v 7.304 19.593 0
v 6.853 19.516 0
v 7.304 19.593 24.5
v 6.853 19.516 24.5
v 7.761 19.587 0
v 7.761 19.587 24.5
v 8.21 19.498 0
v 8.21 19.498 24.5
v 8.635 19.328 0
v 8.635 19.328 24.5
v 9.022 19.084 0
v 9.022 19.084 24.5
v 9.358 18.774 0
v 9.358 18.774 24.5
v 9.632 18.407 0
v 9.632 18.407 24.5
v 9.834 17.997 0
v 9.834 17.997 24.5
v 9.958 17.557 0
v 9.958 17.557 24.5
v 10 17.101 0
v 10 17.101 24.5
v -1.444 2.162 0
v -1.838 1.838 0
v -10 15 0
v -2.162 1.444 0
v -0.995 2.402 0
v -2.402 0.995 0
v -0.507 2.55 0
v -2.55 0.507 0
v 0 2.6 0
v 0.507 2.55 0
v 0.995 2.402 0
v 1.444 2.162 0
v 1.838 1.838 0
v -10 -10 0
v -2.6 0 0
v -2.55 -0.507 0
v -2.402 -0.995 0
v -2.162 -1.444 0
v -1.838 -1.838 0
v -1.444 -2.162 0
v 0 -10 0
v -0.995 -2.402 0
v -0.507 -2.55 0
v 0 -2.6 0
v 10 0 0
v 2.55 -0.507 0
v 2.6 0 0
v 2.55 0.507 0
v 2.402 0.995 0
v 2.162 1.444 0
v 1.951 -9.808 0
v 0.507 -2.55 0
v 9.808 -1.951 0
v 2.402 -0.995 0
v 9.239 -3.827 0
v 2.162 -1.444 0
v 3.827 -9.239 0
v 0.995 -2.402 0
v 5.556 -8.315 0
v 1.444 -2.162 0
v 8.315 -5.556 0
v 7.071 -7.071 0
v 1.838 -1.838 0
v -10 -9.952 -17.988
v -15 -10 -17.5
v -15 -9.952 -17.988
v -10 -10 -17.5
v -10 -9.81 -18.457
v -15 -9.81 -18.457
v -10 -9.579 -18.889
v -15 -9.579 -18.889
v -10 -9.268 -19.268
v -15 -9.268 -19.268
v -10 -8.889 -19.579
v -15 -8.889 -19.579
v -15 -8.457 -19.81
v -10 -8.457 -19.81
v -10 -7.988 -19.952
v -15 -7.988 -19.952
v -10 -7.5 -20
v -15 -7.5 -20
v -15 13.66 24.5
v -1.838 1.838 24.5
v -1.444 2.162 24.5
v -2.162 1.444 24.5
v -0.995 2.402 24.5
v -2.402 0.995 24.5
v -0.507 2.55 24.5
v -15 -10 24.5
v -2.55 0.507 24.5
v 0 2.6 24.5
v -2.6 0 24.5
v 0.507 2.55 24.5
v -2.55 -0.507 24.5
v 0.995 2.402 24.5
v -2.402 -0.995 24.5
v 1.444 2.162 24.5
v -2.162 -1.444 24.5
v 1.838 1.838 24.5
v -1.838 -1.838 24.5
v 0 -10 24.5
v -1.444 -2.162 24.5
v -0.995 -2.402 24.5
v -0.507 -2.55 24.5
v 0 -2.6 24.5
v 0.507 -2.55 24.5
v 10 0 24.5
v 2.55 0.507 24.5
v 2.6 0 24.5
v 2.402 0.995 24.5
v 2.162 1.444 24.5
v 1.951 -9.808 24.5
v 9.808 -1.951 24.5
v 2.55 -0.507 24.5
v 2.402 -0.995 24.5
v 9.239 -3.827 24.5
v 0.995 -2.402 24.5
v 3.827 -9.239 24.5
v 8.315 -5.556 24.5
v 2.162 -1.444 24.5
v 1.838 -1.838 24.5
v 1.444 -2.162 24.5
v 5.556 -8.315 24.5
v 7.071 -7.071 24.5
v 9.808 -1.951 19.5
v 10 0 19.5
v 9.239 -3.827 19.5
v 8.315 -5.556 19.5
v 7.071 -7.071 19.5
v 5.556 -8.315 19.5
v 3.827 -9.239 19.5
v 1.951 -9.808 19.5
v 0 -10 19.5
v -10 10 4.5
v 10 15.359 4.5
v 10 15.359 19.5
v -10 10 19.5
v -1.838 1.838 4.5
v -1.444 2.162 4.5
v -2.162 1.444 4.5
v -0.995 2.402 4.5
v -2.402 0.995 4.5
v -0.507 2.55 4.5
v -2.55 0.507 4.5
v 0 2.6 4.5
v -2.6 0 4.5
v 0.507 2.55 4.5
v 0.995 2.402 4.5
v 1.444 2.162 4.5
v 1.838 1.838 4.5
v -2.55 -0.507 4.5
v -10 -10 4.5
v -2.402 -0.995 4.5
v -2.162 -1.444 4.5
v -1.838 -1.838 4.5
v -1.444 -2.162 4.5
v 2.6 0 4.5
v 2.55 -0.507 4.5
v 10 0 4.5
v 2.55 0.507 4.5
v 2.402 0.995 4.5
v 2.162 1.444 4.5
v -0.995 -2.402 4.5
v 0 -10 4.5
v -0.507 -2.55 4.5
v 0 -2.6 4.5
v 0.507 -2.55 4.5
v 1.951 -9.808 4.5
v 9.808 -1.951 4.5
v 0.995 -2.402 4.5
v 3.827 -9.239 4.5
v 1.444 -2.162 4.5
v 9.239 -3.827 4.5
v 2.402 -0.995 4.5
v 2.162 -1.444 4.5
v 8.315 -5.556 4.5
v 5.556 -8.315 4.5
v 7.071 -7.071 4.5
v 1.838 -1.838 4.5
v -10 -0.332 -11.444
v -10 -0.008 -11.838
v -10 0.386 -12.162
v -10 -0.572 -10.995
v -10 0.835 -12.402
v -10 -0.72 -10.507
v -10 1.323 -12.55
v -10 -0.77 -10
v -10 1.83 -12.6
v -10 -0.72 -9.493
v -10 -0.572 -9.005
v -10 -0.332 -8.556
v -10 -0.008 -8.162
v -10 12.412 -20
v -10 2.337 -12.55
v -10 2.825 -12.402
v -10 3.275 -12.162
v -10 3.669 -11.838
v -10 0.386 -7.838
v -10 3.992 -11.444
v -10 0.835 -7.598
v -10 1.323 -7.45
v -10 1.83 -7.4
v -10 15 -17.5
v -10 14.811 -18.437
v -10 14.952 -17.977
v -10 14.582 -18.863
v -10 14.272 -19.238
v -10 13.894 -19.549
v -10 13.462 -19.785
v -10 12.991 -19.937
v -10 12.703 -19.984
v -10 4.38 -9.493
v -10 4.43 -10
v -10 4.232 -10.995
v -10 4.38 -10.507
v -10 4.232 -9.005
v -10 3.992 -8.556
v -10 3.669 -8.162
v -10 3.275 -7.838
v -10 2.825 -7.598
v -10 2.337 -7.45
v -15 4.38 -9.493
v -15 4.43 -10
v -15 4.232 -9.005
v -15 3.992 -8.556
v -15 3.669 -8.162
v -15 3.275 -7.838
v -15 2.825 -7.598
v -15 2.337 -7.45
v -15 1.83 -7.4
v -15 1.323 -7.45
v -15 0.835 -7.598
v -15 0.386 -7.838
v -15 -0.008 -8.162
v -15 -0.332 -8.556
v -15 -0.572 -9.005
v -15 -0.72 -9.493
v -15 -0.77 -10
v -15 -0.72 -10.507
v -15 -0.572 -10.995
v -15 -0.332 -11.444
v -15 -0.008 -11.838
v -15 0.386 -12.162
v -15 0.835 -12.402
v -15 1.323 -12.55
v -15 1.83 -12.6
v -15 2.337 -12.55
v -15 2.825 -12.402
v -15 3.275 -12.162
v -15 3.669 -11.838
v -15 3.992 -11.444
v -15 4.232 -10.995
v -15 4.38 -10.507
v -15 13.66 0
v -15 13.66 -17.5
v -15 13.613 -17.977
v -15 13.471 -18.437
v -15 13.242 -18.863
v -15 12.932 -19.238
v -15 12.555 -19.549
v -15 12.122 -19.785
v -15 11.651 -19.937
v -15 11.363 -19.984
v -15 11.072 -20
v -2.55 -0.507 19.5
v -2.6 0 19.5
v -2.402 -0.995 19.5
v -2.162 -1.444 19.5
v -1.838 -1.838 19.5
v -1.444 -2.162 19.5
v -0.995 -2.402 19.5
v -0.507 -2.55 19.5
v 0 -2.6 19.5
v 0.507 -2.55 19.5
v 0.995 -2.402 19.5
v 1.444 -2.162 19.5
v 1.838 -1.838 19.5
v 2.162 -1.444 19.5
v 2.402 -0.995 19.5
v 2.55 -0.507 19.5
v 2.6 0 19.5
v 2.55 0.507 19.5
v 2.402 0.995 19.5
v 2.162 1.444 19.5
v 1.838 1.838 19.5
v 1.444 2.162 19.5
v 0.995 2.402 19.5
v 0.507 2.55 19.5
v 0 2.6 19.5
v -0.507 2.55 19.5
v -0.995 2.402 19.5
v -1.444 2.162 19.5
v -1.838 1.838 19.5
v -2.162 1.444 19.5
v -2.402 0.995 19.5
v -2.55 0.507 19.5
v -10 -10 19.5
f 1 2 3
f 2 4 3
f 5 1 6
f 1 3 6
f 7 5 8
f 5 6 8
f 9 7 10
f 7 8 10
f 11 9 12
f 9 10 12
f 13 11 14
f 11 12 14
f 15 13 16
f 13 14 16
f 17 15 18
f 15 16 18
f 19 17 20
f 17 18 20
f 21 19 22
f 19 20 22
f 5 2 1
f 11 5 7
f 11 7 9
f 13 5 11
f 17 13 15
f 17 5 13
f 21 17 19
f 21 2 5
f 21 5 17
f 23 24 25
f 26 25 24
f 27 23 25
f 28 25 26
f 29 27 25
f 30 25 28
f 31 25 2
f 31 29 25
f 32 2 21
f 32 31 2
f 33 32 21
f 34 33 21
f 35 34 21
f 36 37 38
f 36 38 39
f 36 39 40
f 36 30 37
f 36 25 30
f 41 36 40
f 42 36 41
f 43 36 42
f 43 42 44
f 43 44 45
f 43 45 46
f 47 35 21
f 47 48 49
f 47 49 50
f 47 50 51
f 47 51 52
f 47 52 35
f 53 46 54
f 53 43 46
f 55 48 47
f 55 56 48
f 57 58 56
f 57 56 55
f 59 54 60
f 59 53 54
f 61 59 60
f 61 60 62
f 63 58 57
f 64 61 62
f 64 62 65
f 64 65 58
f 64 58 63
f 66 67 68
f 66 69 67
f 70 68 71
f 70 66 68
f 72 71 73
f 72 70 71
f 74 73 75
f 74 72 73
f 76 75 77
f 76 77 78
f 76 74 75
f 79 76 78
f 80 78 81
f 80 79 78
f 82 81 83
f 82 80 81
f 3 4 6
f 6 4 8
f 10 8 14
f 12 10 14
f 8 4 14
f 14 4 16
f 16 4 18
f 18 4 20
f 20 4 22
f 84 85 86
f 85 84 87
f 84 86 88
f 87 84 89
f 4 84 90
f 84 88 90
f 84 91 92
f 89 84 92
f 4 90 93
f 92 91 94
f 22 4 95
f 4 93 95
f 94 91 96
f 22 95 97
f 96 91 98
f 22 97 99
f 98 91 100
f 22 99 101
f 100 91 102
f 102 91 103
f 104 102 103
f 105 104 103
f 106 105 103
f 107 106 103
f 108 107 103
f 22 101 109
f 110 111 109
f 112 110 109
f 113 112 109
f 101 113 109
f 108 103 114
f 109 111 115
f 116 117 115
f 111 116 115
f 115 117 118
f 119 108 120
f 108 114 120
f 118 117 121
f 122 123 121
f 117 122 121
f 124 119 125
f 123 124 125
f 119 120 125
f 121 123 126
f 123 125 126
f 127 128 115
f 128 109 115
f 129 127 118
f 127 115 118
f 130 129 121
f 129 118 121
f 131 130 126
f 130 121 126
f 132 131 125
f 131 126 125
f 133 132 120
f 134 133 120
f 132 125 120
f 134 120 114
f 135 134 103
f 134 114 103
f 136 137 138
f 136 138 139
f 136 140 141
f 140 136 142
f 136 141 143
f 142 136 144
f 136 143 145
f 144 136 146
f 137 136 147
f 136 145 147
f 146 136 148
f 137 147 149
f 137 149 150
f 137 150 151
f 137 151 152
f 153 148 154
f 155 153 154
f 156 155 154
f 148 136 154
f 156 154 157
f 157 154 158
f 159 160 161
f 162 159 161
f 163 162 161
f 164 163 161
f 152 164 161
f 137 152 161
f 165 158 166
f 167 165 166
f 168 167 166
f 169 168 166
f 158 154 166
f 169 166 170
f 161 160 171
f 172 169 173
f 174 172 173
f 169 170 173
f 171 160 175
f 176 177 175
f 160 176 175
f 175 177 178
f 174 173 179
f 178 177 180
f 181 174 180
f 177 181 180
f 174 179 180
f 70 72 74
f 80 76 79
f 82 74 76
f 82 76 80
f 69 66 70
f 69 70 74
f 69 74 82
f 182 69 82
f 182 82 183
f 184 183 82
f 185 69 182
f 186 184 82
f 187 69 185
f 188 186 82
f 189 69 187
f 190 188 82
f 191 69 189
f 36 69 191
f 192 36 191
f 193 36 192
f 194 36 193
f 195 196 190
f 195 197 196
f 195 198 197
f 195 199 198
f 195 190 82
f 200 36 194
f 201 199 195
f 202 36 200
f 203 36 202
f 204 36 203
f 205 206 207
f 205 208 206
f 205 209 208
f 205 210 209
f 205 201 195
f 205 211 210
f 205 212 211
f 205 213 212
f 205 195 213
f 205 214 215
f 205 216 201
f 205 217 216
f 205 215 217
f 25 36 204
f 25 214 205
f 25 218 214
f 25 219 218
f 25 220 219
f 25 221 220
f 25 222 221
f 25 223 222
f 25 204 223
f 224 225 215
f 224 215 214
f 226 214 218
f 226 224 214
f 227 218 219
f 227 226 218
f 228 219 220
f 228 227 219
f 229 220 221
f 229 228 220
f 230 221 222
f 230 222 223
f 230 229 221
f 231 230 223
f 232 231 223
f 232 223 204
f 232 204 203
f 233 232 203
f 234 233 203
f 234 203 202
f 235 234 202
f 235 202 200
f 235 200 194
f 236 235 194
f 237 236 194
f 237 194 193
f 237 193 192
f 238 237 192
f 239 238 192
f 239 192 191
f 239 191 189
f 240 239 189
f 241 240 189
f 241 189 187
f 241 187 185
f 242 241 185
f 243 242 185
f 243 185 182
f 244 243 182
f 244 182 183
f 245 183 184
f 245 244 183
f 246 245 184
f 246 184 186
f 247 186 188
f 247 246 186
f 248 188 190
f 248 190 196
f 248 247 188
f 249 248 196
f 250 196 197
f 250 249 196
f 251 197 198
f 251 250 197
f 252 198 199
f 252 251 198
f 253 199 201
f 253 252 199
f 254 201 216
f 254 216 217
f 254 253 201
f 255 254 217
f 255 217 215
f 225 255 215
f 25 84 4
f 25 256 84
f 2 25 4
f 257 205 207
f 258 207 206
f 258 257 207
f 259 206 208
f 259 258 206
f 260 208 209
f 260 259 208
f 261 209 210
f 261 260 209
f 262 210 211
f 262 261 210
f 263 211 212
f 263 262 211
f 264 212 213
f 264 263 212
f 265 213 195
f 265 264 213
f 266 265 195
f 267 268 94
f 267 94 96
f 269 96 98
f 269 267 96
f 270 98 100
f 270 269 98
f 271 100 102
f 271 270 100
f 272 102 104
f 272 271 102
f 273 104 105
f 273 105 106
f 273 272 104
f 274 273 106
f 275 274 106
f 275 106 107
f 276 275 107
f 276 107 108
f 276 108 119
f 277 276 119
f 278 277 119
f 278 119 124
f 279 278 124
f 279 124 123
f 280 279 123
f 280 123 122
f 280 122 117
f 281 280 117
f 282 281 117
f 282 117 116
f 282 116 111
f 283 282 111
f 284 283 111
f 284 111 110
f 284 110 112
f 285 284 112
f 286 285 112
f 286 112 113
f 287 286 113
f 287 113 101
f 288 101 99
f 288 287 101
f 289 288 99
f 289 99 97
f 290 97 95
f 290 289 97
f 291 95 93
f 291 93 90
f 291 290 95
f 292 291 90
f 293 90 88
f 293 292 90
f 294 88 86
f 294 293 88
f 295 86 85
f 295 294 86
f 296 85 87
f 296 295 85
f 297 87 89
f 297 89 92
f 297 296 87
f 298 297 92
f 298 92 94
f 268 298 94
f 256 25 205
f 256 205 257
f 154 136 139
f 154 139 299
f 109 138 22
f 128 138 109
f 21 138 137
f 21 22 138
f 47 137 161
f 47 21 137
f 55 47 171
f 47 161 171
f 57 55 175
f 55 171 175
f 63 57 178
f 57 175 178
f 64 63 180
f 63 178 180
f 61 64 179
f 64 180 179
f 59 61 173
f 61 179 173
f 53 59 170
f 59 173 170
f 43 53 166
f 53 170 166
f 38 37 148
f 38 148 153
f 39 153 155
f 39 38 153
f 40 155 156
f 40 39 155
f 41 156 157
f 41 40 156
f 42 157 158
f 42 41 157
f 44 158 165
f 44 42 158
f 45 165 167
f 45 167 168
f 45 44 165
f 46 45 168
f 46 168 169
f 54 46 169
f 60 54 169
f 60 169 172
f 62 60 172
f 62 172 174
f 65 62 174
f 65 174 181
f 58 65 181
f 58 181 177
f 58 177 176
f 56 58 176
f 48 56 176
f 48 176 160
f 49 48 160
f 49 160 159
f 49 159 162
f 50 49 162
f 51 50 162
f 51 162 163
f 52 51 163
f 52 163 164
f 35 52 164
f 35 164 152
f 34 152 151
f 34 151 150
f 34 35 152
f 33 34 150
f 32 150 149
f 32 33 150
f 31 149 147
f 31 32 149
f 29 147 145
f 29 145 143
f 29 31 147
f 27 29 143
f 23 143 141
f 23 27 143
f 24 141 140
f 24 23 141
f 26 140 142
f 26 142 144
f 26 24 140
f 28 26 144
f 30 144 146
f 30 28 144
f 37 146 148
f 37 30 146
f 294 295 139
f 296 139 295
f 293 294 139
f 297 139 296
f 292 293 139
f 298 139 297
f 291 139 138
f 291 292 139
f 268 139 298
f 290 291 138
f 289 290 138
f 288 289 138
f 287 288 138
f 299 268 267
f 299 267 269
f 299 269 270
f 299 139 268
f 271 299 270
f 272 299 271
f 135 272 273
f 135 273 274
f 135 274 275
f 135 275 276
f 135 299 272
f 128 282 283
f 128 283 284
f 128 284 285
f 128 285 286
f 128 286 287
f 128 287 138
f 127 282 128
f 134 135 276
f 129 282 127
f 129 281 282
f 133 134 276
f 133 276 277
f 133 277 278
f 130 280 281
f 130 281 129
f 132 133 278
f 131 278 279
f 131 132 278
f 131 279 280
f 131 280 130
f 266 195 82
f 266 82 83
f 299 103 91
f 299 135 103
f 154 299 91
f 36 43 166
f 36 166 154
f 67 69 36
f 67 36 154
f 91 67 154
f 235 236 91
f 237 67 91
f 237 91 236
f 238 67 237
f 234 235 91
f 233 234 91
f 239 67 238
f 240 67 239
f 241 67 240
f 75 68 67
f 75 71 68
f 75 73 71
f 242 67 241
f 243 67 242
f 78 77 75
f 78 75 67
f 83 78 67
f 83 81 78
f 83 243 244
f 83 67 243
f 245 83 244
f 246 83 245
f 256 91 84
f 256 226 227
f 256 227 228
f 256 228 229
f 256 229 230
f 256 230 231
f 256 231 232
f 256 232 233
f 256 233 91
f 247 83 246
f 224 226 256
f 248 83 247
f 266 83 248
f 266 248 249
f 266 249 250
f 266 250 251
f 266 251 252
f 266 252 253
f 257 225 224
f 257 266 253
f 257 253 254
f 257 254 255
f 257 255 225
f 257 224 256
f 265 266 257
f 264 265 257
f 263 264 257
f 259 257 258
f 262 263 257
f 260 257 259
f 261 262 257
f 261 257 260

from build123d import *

# Parameters (mm, degrees)
EXTRUDE_1_DEPTH     = 4.5
EXTRUDE_5_DEPTH     = 19.5
EXTRUDE_6_DEPTH     = 20
EXTRUDE_7_DEPTH     = 5
SKETCH_6_R          = 2.6
CUT_EXTRUDE_1_DEPTH = 36.209916548
SKETCH_13_R         = 2.6
CUT_EXTRUDE_2_DEPTH = 41.493681277
FILLET_1_R          = 2.5
FILLET_2_R          = 10


with BuildPart() as part:
    # Эскиз1 → Бобышка-Вытянуть1 (new body)
    with BuildSketch(Plane.XY):
        Polygon((10, 10), (-10, 10), (-10, -10), (10, -15.358983849), align=None)
    extrude(amount=EXTRUDE_1_DEPTH)

    # Эскиз10 → Бобышка-Вытянуть5 (add)
    with BuildSketch(Plane(origin=(0, 0, 0), x_dir=(-1, 0, 0), z_dir=(0, 0, -1))):
        Polygon((15, 10), (15, -13.660254038), (-10, -20.358983849), (-10, -15.358983849), (10, -10), (10, 10), align=None)
    extrude(amount=-EXTRUDE_5_DEPTH)

    # Эскиз11 → Бобышка-Вытянуть6 (add)
    with BuildSketch(Plane(origin=(0, 0, 0), x_dir=(-1, 0, 0), z_dir=(0, 0, -1))):
        Polygon((15, 10), (10, 10), (10, -15), (15, -13.660254038), align=None)
    extrude(amount=EXTRUDE_6_DEPTH)

    # Эскиз12 → Бобышка-Вытянуть7 (add)
    with BuildSketch(Plane.XY.offset(19.5)):
        Polygon((-15, -13.660254038), (10, -20.358983849), (10, 10), (-15, 10), align=None)
    extrude(amount=EXTRUDE_7_DEPTH)

    # Эскиз6 → Вырез-Вытянуть1 (cut, through all)
    with BuildSketch(Plane(origin=(0, 0, 0), x_dir=(-1, 0, 0), z_dir=(0, 0, -1))):
        Circle(SKETCH_6_R)
    extrude(amount=-CUT_EXTRUDE_1_DEPTH, mode=Mode.SUBTRACT)

    # Эскиз13 → Вырез-Вытянуть2 (cut, through all)
    with BuildSketch(Plane.ZY.offset(15)):
        with Locations(Location((-10, -1.830127019, 0), (0, 0, 270))):
            Circle(SKETCH_13_R)
    extrude(amount=-CUT_EXTRUDE_2_DEPTH, mode=Mode.SUBTRACT)

    # Скругление1
    fillet_1_edges = [part.edges().sort_by_distance(p)[0] for p in [
        (10, -20.358983849, 12.25),
        (-12.5, 10, -20),
        (-12.5, -14.330127019, -20),
    ]]
    fillet(fillet_1_edges, radius=FILLET_1_R)

    # Скругление2
    fillet_2_edges = [part.edges().sort_by_distance(p)[0] for p in [
        (10, 10, 22),
        (10, 10, 2.25),
    ]]
    fillet(fillet_2_edges, radius=FILLET_2_R)


with BuildPart() as body_2:
    # Зеркальное отражение1: mirrored copy
    add(part.part.mirror(Plane.ZX))


solid = body_2.part
